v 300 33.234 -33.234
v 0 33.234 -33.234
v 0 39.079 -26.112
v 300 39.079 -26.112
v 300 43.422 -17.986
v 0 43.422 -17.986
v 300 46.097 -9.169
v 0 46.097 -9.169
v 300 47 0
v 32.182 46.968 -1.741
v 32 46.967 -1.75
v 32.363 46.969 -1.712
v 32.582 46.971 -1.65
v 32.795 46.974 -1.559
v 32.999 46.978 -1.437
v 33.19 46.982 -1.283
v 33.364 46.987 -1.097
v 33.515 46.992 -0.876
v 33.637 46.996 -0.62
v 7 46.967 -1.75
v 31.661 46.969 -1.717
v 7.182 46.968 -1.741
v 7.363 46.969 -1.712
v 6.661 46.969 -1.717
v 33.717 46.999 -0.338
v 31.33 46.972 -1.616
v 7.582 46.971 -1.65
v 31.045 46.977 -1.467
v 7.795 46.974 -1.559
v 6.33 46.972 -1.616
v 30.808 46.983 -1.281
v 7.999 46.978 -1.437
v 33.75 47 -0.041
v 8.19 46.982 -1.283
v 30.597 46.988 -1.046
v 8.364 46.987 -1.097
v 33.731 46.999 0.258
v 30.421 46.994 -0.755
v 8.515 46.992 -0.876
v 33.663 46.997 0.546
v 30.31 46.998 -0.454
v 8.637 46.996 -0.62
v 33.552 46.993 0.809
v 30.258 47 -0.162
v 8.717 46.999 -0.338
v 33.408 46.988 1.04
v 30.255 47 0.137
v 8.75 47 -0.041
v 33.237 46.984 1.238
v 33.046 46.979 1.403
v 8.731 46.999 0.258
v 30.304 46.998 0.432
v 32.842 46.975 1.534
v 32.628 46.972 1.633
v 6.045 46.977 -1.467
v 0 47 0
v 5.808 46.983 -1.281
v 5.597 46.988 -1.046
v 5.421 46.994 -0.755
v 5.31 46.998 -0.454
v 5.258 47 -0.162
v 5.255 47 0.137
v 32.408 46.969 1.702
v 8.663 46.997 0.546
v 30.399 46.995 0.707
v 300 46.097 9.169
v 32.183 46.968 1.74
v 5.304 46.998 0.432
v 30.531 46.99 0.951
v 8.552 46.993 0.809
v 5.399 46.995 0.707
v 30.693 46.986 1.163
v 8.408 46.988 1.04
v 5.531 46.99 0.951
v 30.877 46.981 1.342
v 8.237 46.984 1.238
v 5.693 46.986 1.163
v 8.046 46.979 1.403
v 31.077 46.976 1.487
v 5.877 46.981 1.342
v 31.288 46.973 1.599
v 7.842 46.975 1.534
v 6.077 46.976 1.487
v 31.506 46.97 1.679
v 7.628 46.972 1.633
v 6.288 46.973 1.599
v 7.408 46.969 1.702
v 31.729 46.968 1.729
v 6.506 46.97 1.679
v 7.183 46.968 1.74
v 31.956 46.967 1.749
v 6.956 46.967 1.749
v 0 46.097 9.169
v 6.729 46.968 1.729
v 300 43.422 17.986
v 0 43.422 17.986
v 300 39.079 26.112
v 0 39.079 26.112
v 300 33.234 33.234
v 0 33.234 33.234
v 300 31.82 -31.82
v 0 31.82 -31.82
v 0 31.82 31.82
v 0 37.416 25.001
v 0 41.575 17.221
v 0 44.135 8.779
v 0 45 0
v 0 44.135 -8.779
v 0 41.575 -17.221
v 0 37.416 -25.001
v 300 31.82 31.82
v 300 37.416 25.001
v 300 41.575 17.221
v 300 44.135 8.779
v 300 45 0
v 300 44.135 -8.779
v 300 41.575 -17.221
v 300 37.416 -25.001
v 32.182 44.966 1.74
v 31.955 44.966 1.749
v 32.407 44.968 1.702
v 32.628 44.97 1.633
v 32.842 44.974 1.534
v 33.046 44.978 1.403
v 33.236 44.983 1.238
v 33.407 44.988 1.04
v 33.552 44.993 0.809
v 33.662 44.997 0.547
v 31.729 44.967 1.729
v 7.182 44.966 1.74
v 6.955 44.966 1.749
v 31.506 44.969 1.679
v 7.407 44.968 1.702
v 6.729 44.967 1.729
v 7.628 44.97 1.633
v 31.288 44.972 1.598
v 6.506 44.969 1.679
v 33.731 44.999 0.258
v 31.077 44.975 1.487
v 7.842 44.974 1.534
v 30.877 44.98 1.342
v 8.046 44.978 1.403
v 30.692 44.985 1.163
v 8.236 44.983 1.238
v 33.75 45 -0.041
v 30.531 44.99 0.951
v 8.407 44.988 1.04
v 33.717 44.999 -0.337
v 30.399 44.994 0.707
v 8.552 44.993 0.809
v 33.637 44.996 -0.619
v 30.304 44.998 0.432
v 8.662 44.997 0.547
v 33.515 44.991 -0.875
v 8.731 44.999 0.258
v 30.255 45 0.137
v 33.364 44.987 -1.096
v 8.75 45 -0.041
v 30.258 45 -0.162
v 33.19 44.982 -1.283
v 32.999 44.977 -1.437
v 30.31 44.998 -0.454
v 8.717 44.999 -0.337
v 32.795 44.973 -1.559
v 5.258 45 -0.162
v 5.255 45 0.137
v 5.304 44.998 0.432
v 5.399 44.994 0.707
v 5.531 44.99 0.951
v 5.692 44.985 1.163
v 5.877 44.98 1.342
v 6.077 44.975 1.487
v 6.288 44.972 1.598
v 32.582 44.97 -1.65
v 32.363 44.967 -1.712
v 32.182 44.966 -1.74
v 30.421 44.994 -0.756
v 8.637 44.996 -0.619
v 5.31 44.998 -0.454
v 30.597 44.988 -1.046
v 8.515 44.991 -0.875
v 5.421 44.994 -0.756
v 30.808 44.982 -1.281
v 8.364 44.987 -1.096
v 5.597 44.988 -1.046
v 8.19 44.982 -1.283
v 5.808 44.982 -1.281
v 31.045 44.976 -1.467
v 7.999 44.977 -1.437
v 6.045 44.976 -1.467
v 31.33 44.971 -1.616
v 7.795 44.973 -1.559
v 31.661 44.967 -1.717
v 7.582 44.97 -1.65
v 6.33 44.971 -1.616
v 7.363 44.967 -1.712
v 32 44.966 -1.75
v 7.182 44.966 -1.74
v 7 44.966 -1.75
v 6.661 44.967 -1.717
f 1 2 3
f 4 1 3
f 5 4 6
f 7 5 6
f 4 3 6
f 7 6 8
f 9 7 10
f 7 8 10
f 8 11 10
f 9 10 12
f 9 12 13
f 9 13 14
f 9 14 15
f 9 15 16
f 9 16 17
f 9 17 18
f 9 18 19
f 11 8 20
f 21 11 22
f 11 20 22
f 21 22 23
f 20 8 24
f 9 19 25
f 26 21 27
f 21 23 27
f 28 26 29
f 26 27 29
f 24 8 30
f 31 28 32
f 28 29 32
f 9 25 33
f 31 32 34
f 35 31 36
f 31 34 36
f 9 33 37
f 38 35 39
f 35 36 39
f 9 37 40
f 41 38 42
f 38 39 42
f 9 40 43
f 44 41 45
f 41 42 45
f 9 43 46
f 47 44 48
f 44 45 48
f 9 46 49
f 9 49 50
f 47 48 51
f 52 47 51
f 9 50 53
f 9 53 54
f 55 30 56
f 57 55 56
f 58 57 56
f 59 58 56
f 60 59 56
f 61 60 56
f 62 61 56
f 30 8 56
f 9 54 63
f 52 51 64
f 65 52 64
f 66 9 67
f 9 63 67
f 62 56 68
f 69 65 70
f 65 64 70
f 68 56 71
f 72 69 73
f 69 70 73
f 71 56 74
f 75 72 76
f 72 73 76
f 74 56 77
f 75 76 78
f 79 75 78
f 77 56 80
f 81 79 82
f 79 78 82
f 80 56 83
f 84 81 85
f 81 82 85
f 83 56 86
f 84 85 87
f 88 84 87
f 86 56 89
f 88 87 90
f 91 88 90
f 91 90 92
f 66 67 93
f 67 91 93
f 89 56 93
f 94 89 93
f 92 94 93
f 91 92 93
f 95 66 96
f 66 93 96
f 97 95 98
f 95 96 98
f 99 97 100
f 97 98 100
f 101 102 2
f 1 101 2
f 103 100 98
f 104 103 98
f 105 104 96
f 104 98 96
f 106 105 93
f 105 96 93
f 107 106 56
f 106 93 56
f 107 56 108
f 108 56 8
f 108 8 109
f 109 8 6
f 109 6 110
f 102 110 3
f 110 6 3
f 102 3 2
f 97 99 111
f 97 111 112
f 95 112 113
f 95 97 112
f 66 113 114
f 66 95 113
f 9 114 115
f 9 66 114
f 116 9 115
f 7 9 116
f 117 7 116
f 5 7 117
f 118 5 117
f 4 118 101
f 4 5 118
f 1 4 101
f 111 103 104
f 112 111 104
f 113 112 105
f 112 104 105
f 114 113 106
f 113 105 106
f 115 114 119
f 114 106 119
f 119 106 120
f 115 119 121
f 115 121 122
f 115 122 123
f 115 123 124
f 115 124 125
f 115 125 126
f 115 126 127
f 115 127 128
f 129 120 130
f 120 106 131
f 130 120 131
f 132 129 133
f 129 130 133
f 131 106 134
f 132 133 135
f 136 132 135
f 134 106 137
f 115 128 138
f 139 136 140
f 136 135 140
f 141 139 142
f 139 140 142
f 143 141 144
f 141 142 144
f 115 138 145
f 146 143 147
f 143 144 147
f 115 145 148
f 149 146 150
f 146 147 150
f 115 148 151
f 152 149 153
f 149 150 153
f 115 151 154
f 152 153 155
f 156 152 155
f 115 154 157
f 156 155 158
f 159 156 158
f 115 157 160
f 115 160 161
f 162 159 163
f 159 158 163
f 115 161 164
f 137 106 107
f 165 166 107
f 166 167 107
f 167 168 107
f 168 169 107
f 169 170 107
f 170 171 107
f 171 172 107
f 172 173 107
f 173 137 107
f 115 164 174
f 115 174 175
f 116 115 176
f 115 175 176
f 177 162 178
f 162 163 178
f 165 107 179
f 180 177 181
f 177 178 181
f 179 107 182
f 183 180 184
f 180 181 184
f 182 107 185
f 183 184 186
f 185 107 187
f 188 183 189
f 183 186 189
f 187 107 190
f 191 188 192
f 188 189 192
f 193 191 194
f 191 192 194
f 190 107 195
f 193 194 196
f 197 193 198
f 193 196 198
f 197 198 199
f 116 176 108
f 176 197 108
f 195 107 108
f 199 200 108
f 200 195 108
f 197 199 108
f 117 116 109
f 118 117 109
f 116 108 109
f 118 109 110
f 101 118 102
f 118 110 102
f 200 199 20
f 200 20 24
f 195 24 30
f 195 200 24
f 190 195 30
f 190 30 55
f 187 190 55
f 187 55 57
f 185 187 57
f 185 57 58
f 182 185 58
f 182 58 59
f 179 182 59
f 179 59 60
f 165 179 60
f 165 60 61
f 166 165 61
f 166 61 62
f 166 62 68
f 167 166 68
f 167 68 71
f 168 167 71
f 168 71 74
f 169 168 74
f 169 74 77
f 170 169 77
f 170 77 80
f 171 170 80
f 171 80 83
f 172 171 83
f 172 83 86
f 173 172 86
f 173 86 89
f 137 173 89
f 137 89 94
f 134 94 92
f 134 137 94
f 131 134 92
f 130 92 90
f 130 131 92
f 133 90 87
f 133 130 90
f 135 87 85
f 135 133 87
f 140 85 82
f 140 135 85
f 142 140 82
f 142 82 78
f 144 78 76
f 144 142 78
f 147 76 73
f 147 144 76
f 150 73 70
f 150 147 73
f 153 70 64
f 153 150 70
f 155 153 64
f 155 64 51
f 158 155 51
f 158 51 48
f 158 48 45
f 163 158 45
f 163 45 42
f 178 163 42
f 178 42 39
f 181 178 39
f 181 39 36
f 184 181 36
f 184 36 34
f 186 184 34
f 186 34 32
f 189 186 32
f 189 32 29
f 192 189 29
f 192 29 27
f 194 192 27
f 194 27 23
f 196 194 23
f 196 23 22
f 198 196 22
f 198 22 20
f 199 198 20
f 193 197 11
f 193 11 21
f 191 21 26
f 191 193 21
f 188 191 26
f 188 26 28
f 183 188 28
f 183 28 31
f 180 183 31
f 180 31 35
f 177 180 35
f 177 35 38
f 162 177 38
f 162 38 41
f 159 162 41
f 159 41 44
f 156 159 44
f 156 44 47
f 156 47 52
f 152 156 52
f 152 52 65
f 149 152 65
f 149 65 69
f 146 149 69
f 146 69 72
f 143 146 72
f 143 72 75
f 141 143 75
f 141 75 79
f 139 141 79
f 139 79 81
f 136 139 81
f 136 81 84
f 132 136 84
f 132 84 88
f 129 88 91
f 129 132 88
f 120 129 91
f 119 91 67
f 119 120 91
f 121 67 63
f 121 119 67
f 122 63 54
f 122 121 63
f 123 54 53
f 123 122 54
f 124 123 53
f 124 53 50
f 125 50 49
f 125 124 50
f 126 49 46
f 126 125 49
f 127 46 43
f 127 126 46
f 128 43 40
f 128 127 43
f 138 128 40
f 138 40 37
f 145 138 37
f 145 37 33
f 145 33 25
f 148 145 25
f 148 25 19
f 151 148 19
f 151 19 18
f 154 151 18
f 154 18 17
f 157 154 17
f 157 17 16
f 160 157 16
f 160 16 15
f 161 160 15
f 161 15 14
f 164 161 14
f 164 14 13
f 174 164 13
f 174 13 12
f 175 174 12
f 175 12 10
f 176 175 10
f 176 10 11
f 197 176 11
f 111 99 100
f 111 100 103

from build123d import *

# Parameters (mm, degrees)
BOSS_EXTRUDE1_DEPTH = 300
SKETCH3_R           = 1.75
CUT_EXTRUDE1_DEPTH  = 306.897117362


with BuildPart() as part:
    # Sketch1 → Boss-Extrude1 (new body)
    with BuildSketch(Plane(origin=(0, 0, 0), x_dir=(0, 0, -1), z_dir=(1, 0, 0))):
        with BuildLine():
            Line((31.819805153, 31.819805153), (33.234018716, 33.234018716))
            ThreePointArc((33.234018716, 33.234018716), (0, 47), (-33.234018716, 33.234018716))
            Line((-33.234018716, 33.234018716), (-31.819805153, 31.819805153))
            ThreePointArc((-31.819805153, 31.819805153), (0, 45), (31.819805153, 31.819805153))
        make_face()
    extrude(amount=BOSS_EXTRUDE1_DEPTH)

    # Sketch3 → Cut-Extrude1 (cut, through all)
    with BuildSketch(Plane(origin=(0, 0, -3.698980221), x_dir=(1, 0, 0), z_dir=(0, 1, 0))):
        with Locations(Location((7, -3.698980221, 0), (0, 0, 90))):
            Circle(SKETCH3_R)
        with Locations(Location((32, -3.698980221, 0), (0, 0, 90))):
            Circle(SKETCH3_R)
    extrude(amount=CUT_EXTRUDE1_DEPTH, mode=Mode.SUBTRACT)


solid = part.part
